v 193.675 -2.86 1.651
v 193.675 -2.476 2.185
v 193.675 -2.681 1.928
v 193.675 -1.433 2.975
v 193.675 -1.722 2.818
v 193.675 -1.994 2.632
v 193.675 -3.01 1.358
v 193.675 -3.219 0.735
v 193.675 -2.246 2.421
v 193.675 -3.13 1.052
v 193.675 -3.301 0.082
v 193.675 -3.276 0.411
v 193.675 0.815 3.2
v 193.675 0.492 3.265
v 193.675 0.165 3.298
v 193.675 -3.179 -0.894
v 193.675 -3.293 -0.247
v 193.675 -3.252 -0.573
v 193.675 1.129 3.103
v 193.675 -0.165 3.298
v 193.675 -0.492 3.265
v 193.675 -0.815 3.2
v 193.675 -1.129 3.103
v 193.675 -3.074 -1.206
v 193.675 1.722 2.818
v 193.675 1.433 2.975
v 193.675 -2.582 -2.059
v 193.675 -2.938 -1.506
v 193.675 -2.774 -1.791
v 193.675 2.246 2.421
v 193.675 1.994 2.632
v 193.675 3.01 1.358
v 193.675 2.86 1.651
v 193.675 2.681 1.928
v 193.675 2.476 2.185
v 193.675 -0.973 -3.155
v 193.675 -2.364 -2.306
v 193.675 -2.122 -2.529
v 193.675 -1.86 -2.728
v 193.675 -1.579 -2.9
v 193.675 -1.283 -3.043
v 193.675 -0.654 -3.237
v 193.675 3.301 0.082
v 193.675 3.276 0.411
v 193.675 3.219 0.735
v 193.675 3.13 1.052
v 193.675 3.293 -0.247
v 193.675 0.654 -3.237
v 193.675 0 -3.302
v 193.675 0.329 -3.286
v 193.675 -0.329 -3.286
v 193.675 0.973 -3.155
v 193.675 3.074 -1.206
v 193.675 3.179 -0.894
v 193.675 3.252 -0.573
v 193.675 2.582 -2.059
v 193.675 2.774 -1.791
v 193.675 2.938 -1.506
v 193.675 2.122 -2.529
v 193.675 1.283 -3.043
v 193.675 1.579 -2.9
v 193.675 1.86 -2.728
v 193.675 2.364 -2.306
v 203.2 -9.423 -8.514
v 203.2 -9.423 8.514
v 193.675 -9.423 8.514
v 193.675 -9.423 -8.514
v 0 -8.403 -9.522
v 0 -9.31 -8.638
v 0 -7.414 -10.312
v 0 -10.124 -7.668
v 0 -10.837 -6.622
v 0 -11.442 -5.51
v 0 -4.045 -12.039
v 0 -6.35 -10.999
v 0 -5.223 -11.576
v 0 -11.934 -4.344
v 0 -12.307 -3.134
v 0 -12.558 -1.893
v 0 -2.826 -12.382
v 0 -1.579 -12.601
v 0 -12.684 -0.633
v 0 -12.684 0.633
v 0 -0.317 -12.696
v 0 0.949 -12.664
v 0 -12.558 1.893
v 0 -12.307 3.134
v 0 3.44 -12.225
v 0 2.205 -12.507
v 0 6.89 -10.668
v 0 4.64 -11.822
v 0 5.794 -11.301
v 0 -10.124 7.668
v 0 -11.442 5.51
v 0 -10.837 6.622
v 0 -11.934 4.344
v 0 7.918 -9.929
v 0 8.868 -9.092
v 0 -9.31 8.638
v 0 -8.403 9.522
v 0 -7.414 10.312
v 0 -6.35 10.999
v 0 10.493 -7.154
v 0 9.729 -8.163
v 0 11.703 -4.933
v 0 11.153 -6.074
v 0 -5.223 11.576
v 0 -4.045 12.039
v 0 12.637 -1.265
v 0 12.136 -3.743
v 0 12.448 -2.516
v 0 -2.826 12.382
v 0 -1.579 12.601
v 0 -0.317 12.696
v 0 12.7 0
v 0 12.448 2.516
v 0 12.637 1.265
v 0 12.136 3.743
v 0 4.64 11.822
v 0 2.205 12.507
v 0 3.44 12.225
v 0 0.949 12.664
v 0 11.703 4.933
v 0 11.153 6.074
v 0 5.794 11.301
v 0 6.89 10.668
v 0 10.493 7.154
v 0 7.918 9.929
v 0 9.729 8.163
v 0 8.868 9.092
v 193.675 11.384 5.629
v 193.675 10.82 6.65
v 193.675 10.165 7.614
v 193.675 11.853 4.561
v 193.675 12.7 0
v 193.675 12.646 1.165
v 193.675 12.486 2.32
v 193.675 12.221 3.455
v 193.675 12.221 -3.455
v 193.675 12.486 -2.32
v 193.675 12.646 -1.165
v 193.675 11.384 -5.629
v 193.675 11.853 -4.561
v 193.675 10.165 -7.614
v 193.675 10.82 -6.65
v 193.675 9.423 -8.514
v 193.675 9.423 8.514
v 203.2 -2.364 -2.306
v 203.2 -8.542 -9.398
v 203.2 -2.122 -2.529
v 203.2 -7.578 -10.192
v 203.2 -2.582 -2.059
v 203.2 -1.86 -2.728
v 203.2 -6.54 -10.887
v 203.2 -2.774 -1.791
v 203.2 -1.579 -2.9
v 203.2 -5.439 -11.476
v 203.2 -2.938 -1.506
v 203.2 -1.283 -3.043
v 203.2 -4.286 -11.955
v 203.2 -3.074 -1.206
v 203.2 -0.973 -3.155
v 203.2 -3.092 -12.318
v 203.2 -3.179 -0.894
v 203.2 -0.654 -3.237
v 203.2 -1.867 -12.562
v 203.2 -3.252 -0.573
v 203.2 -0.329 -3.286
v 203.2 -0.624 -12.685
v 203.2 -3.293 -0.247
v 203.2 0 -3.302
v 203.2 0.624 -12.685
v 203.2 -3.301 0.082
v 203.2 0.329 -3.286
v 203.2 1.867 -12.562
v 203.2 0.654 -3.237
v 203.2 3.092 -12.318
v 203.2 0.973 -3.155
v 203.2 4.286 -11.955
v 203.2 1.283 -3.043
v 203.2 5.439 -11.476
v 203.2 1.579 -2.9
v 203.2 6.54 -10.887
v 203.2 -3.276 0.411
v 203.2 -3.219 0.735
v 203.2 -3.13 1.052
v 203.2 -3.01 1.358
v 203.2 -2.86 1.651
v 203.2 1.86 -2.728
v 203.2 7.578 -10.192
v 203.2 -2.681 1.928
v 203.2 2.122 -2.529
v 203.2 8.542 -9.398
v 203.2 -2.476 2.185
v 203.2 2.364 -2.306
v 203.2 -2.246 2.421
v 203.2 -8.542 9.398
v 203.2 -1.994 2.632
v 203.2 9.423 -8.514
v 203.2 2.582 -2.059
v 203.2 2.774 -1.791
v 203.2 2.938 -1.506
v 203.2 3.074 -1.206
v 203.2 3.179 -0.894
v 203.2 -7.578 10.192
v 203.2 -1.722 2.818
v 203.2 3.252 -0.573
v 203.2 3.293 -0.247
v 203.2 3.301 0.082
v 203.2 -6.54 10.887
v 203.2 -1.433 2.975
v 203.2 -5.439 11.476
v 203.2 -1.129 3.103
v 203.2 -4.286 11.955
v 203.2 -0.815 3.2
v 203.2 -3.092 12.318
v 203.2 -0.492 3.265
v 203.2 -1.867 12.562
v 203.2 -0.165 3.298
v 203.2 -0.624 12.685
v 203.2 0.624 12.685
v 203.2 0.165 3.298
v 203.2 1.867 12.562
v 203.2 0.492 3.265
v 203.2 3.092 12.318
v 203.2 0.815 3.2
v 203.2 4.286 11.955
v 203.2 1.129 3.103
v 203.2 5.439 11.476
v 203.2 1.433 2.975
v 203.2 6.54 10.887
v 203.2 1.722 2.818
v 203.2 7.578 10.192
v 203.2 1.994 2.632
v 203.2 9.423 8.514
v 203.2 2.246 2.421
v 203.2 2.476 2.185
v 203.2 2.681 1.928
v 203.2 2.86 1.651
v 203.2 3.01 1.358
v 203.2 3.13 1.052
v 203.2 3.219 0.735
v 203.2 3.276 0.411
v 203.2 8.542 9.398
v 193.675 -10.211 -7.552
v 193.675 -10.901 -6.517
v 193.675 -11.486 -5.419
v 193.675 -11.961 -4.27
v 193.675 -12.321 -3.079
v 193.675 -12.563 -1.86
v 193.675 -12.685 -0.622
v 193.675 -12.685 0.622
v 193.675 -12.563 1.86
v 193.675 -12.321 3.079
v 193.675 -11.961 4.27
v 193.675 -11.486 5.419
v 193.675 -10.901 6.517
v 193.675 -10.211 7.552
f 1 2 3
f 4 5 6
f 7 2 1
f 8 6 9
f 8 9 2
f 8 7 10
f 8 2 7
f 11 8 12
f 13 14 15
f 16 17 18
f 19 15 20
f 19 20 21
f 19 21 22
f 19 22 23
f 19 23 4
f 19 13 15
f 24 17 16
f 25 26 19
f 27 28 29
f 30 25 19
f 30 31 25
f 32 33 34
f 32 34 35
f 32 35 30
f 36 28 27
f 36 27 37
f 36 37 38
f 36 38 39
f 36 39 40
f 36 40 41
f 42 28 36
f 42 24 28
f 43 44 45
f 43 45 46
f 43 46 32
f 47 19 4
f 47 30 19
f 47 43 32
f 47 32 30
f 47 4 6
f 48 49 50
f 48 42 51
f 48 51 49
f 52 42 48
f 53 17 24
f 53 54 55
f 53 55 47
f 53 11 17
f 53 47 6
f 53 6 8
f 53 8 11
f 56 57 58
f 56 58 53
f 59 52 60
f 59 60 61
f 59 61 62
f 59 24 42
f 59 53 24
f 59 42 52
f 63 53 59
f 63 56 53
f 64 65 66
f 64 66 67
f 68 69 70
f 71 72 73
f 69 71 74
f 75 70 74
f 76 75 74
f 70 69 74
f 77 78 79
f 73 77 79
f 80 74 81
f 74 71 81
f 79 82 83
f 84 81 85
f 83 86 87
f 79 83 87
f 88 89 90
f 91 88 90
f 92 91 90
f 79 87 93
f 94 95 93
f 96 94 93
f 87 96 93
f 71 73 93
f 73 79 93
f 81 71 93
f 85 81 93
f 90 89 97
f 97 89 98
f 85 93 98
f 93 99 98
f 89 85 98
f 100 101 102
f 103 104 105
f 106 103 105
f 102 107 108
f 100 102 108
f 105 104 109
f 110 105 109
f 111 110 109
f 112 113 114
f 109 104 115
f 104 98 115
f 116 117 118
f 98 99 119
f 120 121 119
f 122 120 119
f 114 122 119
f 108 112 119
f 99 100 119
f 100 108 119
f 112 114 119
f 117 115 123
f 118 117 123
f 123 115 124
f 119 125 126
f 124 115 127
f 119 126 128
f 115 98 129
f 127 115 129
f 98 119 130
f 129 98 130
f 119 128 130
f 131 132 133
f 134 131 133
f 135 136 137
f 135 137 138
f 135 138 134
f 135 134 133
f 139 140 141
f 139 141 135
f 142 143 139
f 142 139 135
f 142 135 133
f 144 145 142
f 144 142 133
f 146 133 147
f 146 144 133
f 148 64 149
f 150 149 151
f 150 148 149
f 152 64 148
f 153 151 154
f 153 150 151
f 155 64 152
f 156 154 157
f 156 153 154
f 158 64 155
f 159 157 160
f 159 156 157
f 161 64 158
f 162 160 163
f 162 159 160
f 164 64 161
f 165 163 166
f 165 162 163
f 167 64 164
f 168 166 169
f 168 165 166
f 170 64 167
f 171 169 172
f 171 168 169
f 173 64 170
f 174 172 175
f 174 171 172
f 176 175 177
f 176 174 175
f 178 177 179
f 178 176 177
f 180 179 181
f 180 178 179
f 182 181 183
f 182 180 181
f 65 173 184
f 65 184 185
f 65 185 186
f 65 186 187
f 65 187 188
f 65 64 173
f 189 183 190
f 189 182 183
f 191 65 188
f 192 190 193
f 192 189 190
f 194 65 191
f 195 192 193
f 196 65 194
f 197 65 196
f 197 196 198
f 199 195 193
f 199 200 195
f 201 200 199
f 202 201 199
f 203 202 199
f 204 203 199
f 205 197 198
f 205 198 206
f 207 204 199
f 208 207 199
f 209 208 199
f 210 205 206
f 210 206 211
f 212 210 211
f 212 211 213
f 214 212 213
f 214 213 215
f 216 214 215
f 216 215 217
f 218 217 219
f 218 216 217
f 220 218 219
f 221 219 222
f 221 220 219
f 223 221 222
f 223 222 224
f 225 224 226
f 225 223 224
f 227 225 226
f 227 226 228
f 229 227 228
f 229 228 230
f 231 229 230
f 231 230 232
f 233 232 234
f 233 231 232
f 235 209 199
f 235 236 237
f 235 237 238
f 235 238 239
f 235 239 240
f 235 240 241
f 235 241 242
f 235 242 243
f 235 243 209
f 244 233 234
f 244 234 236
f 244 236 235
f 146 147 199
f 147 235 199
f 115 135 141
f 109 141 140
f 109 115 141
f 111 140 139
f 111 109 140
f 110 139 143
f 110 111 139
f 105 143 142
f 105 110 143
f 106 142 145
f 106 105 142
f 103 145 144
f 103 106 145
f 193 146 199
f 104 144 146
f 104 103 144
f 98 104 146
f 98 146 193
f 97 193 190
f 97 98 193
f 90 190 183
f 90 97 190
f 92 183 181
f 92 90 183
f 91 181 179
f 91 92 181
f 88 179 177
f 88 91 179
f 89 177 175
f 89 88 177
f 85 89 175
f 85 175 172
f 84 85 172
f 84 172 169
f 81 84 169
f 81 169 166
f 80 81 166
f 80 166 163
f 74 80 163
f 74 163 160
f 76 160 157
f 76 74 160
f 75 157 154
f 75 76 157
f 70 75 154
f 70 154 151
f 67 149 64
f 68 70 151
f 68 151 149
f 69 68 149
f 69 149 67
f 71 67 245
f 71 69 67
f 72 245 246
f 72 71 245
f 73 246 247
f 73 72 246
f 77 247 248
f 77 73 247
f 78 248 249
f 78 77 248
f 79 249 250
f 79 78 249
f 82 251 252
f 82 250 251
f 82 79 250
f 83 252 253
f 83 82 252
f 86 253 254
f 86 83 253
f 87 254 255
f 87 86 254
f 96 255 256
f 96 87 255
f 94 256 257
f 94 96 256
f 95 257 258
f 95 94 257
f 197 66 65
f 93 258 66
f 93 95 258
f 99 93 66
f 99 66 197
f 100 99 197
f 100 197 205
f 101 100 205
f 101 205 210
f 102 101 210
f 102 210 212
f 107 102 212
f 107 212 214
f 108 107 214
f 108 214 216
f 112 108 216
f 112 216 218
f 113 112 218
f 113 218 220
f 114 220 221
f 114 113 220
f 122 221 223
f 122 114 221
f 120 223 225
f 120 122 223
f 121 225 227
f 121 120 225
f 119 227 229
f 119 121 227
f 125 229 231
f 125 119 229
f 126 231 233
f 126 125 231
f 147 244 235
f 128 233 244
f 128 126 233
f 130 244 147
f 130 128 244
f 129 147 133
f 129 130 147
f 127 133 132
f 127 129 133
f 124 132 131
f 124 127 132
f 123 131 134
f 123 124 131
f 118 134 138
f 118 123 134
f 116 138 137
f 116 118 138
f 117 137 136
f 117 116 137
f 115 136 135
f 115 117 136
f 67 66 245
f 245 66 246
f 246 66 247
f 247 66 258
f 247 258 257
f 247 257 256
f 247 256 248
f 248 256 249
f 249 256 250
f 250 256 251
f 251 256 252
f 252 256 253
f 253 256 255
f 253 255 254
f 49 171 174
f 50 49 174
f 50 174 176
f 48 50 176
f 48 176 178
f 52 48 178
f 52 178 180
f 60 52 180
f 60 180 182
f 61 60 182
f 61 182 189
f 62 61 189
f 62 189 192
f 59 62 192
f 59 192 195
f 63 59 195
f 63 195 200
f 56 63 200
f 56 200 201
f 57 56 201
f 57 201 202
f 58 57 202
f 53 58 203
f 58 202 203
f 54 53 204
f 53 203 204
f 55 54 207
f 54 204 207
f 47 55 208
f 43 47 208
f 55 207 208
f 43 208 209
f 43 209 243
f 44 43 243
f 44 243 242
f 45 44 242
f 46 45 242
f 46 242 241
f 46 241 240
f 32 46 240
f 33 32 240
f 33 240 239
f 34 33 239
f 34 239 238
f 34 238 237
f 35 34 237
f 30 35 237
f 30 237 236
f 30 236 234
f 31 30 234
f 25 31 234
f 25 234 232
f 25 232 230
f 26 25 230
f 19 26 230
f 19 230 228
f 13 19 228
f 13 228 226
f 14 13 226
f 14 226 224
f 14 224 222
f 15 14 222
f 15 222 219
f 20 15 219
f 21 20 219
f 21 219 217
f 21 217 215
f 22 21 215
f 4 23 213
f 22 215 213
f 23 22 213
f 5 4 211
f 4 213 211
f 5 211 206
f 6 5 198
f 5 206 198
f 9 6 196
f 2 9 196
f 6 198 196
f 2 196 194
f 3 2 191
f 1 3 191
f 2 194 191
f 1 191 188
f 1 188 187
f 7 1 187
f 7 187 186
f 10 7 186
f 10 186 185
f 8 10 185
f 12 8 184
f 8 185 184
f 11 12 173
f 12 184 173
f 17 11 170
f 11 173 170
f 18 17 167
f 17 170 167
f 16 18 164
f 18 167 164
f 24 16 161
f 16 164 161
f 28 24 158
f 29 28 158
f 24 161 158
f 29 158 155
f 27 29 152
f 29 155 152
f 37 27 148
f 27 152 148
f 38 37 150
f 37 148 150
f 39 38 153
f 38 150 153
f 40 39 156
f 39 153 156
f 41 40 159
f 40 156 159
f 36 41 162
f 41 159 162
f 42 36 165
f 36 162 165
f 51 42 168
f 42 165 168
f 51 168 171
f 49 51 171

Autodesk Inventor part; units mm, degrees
ref_plane "YZ Plane" through (0, 0, 0) normal (1, 0, 0) x (0, 1, 0)
ref_plane "XZ Plane" through (0, 0, 0) normal (0, 1, 0) x (-1, 0, 0)
ref_plane "XY Plane" through (0, 0, 0) normal (0, 0, 1) x (1, 0, 0)
sketch "Sketch1" plane through (0, 0, 0) normal (1, 0, 0) x (0, 1, 0)
  circle A0 centre (0, 0) radius 12.7
  dimension "d0" = 25.4
extrude "Extrusion1" add sketch "Sketch1" along normal blind 203.2
sketch "Sketch2" plane through (203.2, 0, 0) normal (1, 0, 0) x (0, 0, -1)
  circle A0 centre (0, 0) radius 12.7 projected
  circle A1 centre (0, 0) radius 12.7 projected
  line L0 (-8.5141, 9.4234) -> (8.5141, 9.4234)
  line L1 (-8.5141, -9.4234) -> (8.5141, -9.4234)
  line L2 (-17.78, 0) -> (17.78, 0) projected
  line L3 (0, -17.78) -> (0, 17.78) projected
  circle A2 centre (0, 0) radius 3.302
  dimension "d3" = 18.8468
  dimension "d4" = 6.604
extrude "Extrusion2" cut sketch "Sketch2" against normal blind 9.525 contours L0 L3 A0 | A0 L3 L1 | A2 L3 L2 | L2 L3 A2 | L3 L0 A0 | A0 L1 L3 | L3 A2 L2 | L2 A2 L3
properties part number "DART Rod"
